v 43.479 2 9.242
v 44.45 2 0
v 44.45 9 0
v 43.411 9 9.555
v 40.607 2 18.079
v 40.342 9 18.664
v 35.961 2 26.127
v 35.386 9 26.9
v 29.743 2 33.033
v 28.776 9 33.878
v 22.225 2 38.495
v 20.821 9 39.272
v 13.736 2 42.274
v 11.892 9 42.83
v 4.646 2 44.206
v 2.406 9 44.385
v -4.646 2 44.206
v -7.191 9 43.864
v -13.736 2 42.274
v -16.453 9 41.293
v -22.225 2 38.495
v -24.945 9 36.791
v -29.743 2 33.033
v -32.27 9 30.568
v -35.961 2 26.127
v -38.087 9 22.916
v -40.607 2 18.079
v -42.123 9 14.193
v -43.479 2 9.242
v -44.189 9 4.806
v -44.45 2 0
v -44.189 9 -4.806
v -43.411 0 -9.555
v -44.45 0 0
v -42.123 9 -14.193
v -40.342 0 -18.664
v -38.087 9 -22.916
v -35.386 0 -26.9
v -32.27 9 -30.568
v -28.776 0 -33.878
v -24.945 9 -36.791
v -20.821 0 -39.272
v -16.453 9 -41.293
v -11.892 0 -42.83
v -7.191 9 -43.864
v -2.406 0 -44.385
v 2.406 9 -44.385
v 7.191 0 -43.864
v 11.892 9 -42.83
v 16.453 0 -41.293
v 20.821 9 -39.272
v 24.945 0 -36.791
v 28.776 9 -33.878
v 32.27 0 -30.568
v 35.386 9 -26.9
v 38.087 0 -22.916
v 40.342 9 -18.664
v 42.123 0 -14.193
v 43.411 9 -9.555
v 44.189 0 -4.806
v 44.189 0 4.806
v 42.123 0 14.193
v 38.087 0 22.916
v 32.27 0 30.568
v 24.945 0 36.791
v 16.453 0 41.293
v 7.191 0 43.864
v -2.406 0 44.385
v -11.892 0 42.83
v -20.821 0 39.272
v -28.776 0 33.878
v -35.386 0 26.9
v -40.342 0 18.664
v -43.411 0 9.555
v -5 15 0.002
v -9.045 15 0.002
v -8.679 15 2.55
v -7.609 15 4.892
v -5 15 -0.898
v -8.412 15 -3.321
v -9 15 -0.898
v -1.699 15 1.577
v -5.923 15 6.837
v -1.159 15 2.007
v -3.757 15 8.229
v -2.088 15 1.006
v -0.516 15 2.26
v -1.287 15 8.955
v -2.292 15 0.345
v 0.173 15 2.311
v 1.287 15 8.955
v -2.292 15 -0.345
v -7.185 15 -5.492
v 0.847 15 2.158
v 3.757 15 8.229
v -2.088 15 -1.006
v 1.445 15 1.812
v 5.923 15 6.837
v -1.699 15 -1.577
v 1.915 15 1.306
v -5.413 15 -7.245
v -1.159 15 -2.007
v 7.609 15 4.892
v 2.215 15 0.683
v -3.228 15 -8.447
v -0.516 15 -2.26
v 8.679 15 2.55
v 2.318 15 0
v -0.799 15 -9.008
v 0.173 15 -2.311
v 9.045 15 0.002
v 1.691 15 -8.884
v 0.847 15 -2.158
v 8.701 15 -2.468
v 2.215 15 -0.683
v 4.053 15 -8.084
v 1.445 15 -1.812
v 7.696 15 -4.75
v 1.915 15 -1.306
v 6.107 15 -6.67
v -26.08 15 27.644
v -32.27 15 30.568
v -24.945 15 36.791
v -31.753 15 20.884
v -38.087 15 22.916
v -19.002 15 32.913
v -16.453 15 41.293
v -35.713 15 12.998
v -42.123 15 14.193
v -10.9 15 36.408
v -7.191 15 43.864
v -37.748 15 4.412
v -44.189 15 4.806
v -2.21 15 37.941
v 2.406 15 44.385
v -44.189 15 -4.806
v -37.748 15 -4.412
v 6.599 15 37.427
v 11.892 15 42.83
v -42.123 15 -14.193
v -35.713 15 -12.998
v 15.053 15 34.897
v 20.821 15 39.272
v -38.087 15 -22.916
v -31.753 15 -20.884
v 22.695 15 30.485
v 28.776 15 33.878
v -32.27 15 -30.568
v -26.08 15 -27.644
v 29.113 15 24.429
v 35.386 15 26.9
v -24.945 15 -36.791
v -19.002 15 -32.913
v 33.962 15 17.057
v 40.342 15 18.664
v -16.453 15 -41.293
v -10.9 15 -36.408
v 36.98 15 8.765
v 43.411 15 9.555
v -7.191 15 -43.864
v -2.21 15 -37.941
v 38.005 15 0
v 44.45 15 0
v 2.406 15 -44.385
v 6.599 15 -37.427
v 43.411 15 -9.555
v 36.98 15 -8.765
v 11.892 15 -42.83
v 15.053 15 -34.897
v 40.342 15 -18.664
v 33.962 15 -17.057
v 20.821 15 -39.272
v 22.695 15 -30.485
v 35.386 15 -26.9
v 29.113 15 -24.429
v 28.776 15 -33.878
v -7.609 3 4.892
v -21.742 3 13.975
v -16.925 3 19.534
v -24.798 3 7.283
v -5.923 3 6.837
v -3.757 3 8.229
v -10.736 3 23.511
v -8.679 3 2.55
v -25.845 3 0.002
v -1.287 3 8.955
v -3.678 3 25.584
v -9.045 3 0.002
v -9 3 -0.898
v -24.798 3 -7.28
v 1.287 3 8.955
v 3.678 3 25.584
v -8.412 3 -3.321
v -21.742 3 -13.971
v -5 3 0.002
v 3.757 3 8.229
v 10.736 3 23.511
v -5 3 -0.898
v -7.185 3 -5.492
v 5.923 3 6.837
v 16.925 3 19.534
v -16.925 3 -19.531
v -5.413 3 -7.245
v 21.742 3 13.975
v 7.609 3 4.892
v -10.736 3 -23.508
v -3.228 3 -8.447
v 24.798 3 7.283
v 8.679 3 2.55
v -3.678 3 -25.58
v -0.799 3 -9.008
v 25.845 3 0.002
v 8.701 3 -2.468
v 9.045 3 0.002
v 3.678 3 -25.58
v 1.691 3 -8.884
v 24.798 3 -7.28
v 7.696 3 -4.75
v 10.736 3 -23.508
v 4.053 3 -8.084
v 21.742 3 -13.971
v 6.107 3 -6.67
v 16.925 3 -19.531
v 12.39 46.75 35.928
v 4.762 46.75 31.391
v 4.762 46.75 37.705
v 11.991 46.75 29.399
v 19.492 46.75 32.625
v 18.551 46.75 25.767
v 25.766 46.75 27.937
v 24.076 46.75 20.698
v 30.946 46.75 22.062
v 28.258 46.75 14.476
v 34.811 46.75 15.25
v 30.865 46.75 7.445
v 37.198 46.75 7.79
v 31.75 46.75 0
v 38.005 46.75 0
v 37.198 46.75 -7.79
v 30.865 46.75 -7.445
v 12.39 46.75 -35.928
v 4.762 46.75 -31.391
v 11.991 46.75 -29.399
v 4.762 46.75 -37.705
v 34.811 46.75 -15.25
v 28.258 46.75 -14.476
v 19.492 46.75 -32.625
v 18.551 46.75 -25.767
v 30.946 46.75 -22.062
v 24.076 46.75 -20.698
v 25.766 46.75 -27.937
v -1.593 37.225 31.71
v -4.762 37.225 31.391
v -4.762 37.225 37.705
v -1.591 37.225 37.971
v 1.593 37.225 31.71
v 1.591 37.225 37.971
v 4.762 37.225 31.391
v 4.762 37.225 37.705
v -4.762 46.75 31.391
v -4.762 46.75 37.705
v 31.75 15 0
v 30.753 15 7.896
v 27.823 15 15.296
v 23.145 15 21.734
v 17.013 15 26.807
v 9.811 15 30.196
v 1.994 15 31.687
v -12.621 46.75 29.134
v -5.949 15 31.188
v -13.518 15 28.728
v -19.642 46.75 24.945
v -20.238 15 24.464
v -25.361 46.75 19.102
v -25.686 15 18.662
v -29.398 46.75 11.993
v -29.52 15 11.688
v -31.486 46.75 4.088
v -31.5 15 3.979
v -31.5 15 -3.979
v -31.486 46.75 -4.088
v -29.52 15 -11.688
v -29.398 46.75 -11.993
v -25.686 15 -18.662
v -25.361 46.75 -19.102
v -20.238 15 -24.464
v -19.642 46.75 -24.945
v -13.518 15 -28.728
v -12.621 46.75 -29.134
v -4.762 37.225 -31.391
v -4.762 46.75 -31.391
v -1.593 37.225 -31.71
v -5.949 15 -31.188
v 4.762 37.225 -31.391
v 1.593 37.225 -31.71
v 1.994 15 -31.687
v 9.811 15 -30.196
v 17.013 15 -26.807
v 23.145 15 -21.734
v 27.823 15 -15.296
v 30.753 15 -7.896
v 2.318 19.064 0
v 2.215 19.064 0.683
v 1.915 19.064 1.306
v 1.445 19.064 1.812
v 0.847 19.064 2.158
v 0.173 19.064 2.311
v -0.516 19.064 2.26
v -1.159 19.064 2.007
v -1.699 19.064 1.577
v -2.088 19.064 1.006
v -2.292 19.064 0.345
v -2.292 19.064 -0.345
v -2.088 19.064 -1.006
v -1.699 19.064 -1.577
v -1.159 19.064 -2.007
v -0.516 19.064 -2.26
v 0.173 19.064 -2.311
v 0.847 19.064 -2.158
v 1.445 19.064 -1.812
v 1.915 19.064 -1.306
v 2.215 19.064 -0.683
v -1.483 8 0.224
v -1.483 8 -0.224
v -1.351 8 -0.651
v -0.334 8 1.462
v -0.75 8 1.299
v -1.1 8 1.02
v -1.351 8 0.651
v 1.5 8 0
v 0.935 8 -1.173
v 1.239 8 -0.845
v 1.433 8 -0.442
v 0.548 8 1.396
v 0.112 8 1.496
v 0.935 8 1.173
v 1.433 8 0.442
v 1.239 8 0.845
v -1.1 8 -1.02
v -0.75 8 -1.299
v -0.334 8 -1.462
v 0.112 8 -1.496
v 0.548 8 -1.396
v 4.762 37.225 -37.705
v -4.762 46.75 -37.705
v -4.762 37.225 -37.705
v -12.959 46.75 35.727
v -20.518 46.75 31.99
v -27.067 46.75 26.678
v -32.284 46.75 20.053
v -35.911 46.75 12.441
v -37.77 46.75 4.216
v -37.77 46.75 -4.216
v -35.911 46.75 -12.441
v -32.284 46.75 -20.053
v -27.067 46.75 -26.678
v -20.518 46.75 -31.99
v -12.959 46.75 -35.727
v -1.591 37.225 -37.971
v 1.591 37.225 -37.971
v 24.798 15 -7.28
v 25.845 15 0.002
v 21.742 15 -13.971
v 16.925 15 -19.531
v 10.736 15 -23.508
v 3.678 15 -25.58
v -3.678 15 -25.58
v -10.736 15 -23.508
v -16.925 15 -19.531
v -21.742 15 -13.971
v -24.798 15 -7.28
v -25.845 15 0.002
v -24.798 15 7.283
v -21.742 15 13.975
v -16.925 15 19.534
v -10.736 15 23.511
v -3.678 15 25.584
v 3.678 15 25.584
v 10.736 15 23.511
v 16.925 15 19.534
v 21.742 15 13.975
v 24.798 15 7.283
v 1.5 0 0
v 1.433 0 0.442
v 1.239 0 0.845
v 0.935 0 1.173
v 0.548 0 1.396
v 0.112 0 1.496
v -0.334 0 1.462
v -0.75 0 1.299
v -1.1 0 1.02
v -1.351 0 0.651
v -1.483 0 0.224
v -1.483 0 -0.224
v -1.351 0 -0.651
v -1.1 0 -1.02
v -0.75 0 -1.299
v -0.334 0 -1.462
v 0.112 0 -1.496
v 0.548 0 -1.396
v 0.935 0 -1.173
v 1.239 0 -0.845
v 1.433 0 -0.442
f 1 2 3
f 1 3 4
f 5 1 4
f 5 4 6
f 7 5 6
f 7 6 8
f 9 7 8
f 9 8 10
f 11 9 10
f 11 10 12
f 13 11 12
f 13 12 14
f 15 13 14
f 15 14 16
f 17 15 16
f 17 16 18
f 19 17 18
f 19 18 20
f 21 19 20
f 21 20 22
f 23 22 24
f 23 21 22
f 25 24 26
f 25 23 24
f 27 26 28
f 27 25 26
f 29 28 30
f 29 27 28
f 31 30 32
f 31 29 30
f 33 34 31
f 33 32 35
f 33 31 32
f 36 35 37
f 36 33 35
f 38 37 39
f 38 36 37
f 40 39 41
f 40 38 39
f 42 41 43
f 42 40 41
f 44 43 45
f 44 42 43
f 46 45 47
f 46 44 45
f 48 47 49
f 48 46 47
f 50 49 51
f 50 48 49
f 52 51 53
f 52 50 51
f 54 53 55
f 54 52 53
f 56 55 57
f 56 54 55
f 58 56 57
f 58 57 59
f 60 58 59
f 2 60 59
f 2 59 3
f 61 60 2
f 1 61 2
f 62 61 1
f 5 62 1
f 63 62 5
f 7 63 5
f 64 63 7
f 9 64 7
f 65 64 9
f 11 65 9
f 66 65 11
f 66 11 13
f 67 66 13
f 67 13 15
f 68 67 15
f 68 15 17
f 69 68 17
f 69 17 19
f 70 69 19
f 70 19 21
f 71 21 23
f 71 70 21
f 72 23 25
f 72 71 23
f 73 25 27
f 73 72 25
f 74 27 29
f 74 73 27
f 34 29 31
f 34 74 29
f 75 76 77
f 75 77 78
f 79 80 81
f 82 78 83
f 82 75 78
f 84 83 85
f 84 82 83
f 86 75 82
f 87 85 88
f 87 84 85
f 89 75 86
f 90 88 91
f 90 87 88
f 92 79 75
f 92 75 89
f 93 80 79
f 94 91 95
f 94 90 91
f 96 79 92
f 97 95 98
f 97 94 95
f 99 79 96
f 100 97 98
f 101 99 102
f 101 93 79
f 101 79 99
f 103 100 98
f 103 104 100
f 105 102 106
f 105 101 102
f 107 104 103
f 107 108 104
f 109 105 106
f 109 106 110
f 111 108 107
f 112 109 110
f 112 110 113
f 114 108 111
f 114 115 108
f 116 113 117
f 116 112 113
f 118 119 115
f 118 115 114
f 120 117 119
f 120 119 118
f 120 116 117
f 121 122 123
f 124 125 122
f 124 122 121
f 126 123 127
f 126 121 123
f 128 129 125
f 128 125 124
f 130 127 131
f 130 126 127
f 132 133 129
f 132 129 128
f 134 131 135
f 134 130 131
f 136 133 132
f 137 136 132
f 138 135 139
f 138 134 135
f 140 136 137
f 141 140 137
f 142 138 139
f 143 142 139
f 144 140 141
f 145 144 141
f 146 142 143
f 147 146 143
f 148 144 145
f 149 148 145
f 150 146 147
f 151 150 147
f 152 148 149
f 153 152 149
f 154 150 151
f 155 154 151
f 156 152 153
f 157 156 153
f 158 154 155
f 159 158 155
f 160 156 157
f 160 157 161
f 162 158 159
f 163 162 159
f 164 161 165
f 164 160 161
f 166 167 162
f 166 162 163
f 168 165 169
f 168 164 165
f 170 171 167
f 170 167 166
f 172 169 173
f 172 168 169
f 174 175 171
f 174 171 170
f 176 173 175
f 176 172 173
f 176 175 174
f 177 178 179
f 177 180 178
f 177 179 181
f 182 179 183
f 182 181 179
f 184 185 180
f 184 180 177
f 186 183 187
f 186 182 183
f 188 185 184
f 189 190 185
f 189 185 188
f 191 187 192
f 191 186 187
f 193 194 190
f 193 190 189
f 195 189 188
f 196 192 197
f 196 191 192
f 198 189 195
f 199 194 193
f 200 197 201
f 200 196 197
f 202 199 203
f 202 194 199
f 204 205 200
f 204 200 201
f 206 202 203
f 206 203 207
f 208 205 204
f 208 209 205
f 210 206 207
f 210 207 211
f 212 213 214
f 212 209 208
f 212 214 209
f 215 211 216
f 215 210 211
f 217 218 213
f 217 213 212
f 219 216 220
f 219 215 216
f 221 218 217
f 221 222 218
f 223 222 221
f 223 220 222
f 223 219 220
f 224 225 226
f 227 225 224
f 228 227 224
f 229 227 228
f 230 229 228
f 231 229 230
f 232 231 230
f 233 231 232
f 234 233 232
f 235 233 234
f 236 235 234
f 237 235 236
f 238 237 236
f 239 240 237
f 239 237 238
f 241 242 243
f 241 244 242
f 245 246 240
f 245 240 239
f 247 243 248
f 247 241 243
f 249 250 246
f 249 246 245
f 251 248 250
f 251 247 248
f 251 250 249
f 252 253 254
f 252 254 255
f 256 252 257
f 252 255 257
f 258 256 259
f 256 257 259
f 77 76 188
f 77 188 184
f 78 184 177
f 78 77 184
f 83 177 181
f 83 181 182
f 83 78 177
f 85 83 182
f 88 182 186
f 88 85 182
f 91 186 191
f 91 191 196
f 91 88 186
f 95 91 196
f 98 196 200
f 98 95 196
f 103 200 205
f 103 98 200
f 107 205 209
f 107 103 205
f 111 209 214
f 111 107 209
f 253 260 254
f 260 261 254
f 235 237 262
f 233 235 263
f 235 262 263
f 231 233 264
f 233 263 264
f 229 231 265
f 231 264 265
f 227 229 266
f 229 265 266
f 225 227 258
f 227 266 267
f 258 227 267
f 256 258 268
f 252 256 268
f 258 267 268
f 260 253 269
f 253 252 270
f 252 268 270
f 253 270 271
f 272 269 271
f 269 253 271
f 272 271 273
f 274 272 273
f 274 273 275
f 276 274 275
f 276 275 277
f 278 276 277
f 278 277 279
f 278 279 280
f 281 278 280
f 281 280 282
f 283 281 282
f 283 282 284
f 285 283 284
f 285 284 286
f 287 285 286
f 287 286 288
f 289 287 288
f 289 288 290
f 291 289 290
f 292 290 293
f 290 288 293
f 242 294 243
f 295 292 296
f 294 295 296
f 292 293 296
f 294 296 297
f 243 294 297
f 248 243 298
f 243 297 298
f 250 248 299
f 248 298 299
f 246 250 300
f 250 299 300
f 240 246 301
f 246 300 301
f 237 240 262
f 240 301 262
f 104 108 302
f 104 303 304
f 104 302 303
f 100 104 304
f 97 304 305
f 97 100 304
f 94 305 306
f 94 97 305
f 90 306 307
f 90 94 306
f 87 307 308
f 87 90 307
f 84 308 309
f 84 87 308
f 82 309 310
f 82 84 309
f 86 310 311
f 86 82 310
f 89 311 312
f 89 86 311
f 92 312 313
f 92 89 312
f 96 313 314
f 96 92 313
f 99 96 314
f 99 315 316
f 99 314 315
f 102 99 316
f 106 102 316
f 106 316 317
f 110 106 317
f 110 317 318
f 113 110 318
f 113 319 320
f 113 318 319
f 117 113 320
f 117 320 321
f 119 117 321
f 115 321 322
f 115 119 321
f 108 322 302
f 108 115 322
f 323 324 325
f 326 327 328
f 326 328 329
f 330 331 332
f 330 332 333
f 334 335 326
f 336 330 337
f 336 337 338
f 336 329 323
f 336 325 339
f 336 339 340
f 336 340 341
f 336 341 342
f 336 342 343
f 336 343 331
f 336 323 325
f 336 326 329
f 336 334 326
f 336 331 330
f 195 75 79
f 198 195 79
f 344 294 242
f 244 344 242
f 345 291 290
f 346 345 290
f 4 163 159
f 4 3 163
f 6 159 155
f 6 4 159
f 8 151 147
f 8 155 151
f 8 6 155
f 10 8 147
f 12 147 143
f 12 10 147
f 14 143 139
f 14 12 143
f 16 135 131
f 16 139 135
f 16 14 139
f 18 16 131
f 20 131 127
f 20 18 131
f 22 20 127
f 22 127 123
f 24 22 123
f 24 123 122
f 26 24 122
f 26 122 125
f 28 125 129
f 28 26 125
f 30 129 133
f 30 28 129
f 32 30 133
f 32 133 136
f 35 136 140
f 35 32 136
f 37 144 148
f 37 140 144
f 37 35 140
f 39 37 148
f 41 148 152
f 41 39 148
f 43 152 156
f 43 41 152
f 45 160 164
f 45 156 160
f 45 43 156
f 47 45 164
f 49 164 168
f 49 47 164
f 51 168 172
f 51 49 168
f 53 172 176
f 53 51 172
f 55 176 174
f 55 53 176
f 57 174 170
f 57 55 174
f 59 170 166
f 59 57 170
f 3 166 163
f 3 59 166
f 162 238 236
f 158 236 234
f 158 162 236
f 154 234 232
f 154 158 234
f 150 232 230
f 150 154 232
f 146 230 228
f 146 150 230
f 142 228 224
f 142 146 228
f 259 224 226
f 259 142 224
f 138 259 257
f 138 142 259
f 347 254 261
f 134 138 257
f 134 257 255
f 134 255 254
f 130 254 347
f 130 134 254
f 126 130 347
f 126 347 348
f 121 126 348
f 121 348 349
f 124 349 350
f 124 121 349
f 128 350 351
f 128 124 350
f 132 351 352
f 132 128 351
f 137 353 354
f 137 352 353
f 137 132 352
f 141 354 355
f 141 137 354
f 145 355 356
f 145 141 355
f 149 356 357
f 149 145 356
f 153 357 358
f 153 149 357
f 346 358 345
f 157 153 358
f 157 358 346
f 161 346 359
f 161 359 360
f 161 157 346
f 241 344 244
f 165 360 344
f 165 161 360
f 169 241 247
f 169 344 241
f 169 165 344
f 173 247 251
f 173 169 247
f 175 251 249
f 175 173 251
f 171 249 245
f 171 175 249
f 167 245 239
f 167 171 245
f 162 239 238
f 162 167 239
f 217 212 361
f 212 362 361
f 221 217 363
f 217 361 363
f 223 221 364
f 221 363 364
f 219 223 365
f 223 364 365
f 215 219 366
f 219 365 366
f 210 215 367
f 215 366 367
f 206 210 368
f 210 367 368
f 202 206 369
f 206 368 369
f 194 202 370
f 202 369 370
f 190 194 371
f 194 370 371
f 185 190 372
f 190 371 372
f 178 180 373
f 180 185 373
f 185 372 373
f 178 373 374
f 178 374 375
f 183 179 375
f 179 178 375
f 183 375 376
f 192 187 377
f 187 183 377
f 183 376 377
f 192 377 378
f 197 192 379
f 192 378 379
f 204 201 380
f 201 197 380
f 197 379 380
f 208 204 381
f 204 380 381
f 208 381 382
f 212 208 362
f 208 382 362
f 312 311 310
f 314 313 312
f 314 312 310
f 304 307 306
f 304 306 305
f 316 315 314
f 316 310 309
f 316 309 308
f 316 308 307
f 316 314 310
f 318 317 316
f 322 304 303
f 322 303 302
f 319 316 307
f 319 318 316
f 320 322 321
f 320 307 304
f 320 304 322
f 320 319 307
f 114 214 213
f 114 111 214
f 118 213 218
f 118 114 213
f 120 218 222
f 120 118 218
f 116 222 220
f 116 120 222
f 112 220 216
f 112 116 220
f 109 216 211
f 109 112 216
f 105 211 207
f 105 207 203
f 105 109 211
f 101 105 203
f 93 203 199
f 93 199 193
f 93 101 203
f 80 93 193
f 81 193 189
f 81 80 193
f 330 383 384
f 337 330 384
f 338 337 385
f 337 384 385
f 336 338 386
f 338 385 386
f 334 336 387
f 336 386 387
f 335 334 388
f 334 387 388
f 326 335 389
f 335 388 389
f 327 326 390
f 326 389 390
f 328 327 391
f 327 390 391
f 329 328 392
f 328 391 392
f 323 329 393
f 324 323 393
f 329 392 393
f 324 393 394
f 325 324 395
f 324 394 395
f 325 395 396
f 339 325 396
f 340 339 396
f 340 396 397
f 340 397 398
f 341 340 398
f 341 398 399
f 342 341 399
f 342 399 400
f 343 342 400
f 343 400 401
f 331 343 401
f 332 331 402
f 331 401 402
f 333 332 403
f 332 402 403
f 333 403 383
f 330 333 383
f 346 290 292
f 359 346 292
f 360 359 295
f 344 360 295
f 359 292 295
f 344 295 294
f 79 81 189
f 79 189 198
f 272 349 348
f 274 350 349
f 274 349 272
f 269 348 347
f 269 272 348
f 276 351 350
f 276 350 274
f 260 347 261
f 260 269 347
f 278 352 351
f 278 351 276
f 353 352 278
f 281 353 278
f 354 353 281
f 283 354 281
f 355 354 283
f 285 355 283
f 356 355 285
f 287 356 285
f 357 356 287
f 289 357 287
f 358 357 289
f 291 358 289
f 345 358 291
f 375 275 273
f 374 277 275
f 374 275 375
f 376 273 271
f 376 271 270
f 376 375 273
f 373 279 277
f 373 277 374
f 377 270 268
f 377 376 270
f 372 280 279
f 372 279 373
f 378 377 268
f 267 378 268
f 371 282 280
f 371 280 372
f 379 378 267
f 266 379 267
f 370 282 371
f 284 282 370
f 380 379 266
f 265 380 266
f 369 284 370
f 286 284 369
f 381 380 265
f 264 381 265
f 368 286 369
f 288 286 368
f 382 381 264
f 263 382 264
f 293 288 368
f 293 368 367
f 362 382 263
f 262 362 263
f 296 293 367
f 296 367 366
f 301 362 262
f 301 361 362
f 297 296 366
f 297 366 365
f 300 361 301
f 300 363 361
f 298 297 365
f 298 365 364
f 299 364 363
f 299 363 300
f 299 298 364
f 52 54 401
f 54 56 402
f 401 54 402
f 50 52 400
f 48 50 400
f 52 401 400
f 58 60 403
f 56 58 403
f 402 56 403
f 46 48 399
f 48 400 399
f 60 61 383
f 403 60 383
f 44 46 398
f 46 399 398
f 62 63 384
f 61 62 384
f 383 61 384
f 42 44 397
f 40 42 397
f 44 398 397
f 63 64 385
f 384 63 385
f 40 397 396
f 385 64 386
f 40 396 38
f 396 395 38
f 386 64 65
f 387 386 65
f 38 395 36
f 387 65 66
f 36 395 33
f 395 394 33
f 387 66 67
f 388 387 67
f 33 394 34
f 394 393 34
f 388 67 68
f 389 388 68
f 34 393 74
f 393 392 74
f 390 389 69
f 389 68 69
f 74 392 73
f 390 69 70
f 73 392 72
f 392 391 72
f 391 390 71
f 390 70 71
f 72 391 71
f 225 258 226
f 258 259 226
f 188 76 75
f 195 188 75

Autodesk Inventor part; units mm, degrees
sketch "Sketch1" plane through (0, 0, 0) normal (0, 1, 0) x (-1, 0, 0)
  circle A0 centre (0, 0) radius 44.45
  circle A1 centre (0, 0) radius 6.75
  dimension "d0" = 88.9
  dimension "d3" = 13.5
extrude "Extrusion2" add sketch "Sketch1" along normal blind 2 contours A0 | A1
sketch "Sketch2" plane through (0, 2, 0) normal (0, 1, 0) x (1, 0, 0)
  circle A0 centre (0, 0) radius 10
  circle A1 centre (0, 0) radius 44.45
  dimension "d6" = 20
  dimension "d37" = 88.9
extrude "Extrusion3" add sketch "Sketch2" along normal blind 7 contours A0 | A1
sketch "Sketch3" plane through (0, 9, 0) normal (0, 1, 0) x (1, 0, 0)
  circle A0 centre (0, 0) radius 44.45
  dimension "d9" = 88.9
extrude "Extrusion4" add sketch "Sketch3" along normal blind 6
sketch "Sketch4" plane through (0, 15, 0) normal (0, 1, 0) x (1, 0, 0)
  circle A0 centre (0, 0) radius 38.0048
  circle A1 centre (0, 0) radius 31.75
  point P0 (-38.0048, 0)
  point P1 (0, 38.0048)
  point P2 (38.0048, 0)
  point P3 (0, -38.0048)
  dimension "d12" = 76.0095
  dimension "d13" = 63.5
extrude "Extrusion5" add sketch "Sketch4" along normal blind 31.75
ref_plane "Work Plane3" through (38.0048, 15, 0) normal (1, 0, 0) x (0, 1, 0)
ref_plane "Work Plane4" through (-38.0048, 15, 0) normal (-1, 0, 0) x (0, -1, 0)
sketch "Sketch8" plane through (38.0048, 15, 0) normal (1, 0, 0) x (0, 1, 0)
  line L0 (31.75, -38.0048) -> (31.75, 38.0048) projected
  line L1 (31.75, 6.35) -> (14.224, 6.35)
  line L2 (14.224, 6.35) -> (14.224, -6.35)
  line L3 (14.224, -6.35) -> (31.75, -6.35)
  line L4 (31.75, -6.35) -> (31.75, 6.35)
  line L5 (31.75, 0) -> (0, 0)
  line L6 (0, -44.45) -> (0, 44.45) projected
  line L7 (21.844, 5.08) -> (17.4498, 5.08)
  line L8 (17.4498, 5.08) -> (17.4498, -5.08)
  line L9 (17.4498, -5.08) -> (21.844, -5.08)
  line L10 (21.844, -5.08) -> (21.844, 5.08)
  line L11 (25.146, 6.35) -> (25.146, -6.35)
  point P0 (-15, 0)
  dimension "d38" = 17.526
  dimension "d39" = 12.7
  dimension "d41" = 6.35
  dimension "d42" = 9.906
  dimension "d43" = 10.16
  dimension "d44" = 5.08
  dimension "d46" = 4.3942
  dimension "d70" = 6.604
extrude "Extrusion9" [suppressed]
ref_plane "Work Plane5" through (0, 15, 0) normal (-1, 0, 0) x (0, -1, 0)
mirror "Mirror1" [suppressed]
fillet "Fillet3" [suppressed]
fillet "Fillet4" [suppressed]
fillet "Fillet5" [suppressed]
fillet "Fillet6" [suppressed]
sketch "Sketch9" plane through (0, 15, 0) normal (0, 1, 0) x (1, 0, 0)
  line L0 (-9, 0.8983) -> (-5, 0.8983)
  line L1 (-9.0449, -0.0017) -> (-5, -0.0017)
  line L2 (-5, -0.0017) -> (-5, 0.8983)
  circle A0 centre (0, -0.0017) radius 9.0449
  circle A1 centre (0, -0.0017) radius 21.8449
  line L3 (-21.8449, 0) -> (-25.8449, 0)
  circle A2 centre (0, -0.0017) radius 25.8449
  point P0 (0, 0)
  dimension "d62" = 43.6898
  dimension "d57" = 4
  dimension "d58" = 5
  dimension "d60" = 0.9
  dimension "x" = 18.0898
  dimension "d63" = 4
extrude "Extrusion10" cut sketch "Sketch9" against normal blind 12 contours L0 L2 L1 A0 | A1 | A2 picked at (-6.3416, 0.4985)
sketch "Sketch10" plane through (0, 15, 0) normal (0, 1, 0) x (1, 0, 0)
  circle A0 centre (0, 0) radius 2.3178
  dimension "d67" = 4.6355
extrude "Extrusion11" add sketch "Sketch10" along normal blind 4.064
ref_plane "Work Plane6" through (0, 15, 38.0048) normal (0, 0, 1) x (1, 0, 0)
sketch "Sketch11" plane through (0, 15, 38.0048) normal (0, 0, 1) x (1, 0, 0)
  line L0 (-31.75, 31.75) -> (31.75, 31.75) projected
  line L1 (0, 31.75) -> (0, 22.225)
  line L2 (-4.7625, 22.225) -> (4.7625, 22.225)
  line L3 (4.7625, 22.225) -> (4.7625, 31.75)
  line L4 (4.7625, 31.75) -> (-4.7625, 31.75)
  line L5 (-4.7625, 31.75) -> (-4.7625, 22.225)
  point P0 (0, -15)
  point P1 (-4.7625, 31.75)
  dimension "d71" = 9.525
  dimension "d72" = 4.7625
  dimension "d73" = 4.7625
extrude "Extrusion12" cut sketch "Sketch11" against normal blind 100.0872
sketch "Sketch12" plane through (0, 0, 0) normal (0, -1, 0) x (1, 0, 0)
  circle A0 centre (0, 0) radius 1.5
  dimension "d76" = 3
extrude "Extrusion13" cut sketch "Sketch12" against normal blind 8
thread "Thread2" size "M3x0.5" class "6H" standard "ANSI Metric M Profile" full length
properties part number "LidBottom"
